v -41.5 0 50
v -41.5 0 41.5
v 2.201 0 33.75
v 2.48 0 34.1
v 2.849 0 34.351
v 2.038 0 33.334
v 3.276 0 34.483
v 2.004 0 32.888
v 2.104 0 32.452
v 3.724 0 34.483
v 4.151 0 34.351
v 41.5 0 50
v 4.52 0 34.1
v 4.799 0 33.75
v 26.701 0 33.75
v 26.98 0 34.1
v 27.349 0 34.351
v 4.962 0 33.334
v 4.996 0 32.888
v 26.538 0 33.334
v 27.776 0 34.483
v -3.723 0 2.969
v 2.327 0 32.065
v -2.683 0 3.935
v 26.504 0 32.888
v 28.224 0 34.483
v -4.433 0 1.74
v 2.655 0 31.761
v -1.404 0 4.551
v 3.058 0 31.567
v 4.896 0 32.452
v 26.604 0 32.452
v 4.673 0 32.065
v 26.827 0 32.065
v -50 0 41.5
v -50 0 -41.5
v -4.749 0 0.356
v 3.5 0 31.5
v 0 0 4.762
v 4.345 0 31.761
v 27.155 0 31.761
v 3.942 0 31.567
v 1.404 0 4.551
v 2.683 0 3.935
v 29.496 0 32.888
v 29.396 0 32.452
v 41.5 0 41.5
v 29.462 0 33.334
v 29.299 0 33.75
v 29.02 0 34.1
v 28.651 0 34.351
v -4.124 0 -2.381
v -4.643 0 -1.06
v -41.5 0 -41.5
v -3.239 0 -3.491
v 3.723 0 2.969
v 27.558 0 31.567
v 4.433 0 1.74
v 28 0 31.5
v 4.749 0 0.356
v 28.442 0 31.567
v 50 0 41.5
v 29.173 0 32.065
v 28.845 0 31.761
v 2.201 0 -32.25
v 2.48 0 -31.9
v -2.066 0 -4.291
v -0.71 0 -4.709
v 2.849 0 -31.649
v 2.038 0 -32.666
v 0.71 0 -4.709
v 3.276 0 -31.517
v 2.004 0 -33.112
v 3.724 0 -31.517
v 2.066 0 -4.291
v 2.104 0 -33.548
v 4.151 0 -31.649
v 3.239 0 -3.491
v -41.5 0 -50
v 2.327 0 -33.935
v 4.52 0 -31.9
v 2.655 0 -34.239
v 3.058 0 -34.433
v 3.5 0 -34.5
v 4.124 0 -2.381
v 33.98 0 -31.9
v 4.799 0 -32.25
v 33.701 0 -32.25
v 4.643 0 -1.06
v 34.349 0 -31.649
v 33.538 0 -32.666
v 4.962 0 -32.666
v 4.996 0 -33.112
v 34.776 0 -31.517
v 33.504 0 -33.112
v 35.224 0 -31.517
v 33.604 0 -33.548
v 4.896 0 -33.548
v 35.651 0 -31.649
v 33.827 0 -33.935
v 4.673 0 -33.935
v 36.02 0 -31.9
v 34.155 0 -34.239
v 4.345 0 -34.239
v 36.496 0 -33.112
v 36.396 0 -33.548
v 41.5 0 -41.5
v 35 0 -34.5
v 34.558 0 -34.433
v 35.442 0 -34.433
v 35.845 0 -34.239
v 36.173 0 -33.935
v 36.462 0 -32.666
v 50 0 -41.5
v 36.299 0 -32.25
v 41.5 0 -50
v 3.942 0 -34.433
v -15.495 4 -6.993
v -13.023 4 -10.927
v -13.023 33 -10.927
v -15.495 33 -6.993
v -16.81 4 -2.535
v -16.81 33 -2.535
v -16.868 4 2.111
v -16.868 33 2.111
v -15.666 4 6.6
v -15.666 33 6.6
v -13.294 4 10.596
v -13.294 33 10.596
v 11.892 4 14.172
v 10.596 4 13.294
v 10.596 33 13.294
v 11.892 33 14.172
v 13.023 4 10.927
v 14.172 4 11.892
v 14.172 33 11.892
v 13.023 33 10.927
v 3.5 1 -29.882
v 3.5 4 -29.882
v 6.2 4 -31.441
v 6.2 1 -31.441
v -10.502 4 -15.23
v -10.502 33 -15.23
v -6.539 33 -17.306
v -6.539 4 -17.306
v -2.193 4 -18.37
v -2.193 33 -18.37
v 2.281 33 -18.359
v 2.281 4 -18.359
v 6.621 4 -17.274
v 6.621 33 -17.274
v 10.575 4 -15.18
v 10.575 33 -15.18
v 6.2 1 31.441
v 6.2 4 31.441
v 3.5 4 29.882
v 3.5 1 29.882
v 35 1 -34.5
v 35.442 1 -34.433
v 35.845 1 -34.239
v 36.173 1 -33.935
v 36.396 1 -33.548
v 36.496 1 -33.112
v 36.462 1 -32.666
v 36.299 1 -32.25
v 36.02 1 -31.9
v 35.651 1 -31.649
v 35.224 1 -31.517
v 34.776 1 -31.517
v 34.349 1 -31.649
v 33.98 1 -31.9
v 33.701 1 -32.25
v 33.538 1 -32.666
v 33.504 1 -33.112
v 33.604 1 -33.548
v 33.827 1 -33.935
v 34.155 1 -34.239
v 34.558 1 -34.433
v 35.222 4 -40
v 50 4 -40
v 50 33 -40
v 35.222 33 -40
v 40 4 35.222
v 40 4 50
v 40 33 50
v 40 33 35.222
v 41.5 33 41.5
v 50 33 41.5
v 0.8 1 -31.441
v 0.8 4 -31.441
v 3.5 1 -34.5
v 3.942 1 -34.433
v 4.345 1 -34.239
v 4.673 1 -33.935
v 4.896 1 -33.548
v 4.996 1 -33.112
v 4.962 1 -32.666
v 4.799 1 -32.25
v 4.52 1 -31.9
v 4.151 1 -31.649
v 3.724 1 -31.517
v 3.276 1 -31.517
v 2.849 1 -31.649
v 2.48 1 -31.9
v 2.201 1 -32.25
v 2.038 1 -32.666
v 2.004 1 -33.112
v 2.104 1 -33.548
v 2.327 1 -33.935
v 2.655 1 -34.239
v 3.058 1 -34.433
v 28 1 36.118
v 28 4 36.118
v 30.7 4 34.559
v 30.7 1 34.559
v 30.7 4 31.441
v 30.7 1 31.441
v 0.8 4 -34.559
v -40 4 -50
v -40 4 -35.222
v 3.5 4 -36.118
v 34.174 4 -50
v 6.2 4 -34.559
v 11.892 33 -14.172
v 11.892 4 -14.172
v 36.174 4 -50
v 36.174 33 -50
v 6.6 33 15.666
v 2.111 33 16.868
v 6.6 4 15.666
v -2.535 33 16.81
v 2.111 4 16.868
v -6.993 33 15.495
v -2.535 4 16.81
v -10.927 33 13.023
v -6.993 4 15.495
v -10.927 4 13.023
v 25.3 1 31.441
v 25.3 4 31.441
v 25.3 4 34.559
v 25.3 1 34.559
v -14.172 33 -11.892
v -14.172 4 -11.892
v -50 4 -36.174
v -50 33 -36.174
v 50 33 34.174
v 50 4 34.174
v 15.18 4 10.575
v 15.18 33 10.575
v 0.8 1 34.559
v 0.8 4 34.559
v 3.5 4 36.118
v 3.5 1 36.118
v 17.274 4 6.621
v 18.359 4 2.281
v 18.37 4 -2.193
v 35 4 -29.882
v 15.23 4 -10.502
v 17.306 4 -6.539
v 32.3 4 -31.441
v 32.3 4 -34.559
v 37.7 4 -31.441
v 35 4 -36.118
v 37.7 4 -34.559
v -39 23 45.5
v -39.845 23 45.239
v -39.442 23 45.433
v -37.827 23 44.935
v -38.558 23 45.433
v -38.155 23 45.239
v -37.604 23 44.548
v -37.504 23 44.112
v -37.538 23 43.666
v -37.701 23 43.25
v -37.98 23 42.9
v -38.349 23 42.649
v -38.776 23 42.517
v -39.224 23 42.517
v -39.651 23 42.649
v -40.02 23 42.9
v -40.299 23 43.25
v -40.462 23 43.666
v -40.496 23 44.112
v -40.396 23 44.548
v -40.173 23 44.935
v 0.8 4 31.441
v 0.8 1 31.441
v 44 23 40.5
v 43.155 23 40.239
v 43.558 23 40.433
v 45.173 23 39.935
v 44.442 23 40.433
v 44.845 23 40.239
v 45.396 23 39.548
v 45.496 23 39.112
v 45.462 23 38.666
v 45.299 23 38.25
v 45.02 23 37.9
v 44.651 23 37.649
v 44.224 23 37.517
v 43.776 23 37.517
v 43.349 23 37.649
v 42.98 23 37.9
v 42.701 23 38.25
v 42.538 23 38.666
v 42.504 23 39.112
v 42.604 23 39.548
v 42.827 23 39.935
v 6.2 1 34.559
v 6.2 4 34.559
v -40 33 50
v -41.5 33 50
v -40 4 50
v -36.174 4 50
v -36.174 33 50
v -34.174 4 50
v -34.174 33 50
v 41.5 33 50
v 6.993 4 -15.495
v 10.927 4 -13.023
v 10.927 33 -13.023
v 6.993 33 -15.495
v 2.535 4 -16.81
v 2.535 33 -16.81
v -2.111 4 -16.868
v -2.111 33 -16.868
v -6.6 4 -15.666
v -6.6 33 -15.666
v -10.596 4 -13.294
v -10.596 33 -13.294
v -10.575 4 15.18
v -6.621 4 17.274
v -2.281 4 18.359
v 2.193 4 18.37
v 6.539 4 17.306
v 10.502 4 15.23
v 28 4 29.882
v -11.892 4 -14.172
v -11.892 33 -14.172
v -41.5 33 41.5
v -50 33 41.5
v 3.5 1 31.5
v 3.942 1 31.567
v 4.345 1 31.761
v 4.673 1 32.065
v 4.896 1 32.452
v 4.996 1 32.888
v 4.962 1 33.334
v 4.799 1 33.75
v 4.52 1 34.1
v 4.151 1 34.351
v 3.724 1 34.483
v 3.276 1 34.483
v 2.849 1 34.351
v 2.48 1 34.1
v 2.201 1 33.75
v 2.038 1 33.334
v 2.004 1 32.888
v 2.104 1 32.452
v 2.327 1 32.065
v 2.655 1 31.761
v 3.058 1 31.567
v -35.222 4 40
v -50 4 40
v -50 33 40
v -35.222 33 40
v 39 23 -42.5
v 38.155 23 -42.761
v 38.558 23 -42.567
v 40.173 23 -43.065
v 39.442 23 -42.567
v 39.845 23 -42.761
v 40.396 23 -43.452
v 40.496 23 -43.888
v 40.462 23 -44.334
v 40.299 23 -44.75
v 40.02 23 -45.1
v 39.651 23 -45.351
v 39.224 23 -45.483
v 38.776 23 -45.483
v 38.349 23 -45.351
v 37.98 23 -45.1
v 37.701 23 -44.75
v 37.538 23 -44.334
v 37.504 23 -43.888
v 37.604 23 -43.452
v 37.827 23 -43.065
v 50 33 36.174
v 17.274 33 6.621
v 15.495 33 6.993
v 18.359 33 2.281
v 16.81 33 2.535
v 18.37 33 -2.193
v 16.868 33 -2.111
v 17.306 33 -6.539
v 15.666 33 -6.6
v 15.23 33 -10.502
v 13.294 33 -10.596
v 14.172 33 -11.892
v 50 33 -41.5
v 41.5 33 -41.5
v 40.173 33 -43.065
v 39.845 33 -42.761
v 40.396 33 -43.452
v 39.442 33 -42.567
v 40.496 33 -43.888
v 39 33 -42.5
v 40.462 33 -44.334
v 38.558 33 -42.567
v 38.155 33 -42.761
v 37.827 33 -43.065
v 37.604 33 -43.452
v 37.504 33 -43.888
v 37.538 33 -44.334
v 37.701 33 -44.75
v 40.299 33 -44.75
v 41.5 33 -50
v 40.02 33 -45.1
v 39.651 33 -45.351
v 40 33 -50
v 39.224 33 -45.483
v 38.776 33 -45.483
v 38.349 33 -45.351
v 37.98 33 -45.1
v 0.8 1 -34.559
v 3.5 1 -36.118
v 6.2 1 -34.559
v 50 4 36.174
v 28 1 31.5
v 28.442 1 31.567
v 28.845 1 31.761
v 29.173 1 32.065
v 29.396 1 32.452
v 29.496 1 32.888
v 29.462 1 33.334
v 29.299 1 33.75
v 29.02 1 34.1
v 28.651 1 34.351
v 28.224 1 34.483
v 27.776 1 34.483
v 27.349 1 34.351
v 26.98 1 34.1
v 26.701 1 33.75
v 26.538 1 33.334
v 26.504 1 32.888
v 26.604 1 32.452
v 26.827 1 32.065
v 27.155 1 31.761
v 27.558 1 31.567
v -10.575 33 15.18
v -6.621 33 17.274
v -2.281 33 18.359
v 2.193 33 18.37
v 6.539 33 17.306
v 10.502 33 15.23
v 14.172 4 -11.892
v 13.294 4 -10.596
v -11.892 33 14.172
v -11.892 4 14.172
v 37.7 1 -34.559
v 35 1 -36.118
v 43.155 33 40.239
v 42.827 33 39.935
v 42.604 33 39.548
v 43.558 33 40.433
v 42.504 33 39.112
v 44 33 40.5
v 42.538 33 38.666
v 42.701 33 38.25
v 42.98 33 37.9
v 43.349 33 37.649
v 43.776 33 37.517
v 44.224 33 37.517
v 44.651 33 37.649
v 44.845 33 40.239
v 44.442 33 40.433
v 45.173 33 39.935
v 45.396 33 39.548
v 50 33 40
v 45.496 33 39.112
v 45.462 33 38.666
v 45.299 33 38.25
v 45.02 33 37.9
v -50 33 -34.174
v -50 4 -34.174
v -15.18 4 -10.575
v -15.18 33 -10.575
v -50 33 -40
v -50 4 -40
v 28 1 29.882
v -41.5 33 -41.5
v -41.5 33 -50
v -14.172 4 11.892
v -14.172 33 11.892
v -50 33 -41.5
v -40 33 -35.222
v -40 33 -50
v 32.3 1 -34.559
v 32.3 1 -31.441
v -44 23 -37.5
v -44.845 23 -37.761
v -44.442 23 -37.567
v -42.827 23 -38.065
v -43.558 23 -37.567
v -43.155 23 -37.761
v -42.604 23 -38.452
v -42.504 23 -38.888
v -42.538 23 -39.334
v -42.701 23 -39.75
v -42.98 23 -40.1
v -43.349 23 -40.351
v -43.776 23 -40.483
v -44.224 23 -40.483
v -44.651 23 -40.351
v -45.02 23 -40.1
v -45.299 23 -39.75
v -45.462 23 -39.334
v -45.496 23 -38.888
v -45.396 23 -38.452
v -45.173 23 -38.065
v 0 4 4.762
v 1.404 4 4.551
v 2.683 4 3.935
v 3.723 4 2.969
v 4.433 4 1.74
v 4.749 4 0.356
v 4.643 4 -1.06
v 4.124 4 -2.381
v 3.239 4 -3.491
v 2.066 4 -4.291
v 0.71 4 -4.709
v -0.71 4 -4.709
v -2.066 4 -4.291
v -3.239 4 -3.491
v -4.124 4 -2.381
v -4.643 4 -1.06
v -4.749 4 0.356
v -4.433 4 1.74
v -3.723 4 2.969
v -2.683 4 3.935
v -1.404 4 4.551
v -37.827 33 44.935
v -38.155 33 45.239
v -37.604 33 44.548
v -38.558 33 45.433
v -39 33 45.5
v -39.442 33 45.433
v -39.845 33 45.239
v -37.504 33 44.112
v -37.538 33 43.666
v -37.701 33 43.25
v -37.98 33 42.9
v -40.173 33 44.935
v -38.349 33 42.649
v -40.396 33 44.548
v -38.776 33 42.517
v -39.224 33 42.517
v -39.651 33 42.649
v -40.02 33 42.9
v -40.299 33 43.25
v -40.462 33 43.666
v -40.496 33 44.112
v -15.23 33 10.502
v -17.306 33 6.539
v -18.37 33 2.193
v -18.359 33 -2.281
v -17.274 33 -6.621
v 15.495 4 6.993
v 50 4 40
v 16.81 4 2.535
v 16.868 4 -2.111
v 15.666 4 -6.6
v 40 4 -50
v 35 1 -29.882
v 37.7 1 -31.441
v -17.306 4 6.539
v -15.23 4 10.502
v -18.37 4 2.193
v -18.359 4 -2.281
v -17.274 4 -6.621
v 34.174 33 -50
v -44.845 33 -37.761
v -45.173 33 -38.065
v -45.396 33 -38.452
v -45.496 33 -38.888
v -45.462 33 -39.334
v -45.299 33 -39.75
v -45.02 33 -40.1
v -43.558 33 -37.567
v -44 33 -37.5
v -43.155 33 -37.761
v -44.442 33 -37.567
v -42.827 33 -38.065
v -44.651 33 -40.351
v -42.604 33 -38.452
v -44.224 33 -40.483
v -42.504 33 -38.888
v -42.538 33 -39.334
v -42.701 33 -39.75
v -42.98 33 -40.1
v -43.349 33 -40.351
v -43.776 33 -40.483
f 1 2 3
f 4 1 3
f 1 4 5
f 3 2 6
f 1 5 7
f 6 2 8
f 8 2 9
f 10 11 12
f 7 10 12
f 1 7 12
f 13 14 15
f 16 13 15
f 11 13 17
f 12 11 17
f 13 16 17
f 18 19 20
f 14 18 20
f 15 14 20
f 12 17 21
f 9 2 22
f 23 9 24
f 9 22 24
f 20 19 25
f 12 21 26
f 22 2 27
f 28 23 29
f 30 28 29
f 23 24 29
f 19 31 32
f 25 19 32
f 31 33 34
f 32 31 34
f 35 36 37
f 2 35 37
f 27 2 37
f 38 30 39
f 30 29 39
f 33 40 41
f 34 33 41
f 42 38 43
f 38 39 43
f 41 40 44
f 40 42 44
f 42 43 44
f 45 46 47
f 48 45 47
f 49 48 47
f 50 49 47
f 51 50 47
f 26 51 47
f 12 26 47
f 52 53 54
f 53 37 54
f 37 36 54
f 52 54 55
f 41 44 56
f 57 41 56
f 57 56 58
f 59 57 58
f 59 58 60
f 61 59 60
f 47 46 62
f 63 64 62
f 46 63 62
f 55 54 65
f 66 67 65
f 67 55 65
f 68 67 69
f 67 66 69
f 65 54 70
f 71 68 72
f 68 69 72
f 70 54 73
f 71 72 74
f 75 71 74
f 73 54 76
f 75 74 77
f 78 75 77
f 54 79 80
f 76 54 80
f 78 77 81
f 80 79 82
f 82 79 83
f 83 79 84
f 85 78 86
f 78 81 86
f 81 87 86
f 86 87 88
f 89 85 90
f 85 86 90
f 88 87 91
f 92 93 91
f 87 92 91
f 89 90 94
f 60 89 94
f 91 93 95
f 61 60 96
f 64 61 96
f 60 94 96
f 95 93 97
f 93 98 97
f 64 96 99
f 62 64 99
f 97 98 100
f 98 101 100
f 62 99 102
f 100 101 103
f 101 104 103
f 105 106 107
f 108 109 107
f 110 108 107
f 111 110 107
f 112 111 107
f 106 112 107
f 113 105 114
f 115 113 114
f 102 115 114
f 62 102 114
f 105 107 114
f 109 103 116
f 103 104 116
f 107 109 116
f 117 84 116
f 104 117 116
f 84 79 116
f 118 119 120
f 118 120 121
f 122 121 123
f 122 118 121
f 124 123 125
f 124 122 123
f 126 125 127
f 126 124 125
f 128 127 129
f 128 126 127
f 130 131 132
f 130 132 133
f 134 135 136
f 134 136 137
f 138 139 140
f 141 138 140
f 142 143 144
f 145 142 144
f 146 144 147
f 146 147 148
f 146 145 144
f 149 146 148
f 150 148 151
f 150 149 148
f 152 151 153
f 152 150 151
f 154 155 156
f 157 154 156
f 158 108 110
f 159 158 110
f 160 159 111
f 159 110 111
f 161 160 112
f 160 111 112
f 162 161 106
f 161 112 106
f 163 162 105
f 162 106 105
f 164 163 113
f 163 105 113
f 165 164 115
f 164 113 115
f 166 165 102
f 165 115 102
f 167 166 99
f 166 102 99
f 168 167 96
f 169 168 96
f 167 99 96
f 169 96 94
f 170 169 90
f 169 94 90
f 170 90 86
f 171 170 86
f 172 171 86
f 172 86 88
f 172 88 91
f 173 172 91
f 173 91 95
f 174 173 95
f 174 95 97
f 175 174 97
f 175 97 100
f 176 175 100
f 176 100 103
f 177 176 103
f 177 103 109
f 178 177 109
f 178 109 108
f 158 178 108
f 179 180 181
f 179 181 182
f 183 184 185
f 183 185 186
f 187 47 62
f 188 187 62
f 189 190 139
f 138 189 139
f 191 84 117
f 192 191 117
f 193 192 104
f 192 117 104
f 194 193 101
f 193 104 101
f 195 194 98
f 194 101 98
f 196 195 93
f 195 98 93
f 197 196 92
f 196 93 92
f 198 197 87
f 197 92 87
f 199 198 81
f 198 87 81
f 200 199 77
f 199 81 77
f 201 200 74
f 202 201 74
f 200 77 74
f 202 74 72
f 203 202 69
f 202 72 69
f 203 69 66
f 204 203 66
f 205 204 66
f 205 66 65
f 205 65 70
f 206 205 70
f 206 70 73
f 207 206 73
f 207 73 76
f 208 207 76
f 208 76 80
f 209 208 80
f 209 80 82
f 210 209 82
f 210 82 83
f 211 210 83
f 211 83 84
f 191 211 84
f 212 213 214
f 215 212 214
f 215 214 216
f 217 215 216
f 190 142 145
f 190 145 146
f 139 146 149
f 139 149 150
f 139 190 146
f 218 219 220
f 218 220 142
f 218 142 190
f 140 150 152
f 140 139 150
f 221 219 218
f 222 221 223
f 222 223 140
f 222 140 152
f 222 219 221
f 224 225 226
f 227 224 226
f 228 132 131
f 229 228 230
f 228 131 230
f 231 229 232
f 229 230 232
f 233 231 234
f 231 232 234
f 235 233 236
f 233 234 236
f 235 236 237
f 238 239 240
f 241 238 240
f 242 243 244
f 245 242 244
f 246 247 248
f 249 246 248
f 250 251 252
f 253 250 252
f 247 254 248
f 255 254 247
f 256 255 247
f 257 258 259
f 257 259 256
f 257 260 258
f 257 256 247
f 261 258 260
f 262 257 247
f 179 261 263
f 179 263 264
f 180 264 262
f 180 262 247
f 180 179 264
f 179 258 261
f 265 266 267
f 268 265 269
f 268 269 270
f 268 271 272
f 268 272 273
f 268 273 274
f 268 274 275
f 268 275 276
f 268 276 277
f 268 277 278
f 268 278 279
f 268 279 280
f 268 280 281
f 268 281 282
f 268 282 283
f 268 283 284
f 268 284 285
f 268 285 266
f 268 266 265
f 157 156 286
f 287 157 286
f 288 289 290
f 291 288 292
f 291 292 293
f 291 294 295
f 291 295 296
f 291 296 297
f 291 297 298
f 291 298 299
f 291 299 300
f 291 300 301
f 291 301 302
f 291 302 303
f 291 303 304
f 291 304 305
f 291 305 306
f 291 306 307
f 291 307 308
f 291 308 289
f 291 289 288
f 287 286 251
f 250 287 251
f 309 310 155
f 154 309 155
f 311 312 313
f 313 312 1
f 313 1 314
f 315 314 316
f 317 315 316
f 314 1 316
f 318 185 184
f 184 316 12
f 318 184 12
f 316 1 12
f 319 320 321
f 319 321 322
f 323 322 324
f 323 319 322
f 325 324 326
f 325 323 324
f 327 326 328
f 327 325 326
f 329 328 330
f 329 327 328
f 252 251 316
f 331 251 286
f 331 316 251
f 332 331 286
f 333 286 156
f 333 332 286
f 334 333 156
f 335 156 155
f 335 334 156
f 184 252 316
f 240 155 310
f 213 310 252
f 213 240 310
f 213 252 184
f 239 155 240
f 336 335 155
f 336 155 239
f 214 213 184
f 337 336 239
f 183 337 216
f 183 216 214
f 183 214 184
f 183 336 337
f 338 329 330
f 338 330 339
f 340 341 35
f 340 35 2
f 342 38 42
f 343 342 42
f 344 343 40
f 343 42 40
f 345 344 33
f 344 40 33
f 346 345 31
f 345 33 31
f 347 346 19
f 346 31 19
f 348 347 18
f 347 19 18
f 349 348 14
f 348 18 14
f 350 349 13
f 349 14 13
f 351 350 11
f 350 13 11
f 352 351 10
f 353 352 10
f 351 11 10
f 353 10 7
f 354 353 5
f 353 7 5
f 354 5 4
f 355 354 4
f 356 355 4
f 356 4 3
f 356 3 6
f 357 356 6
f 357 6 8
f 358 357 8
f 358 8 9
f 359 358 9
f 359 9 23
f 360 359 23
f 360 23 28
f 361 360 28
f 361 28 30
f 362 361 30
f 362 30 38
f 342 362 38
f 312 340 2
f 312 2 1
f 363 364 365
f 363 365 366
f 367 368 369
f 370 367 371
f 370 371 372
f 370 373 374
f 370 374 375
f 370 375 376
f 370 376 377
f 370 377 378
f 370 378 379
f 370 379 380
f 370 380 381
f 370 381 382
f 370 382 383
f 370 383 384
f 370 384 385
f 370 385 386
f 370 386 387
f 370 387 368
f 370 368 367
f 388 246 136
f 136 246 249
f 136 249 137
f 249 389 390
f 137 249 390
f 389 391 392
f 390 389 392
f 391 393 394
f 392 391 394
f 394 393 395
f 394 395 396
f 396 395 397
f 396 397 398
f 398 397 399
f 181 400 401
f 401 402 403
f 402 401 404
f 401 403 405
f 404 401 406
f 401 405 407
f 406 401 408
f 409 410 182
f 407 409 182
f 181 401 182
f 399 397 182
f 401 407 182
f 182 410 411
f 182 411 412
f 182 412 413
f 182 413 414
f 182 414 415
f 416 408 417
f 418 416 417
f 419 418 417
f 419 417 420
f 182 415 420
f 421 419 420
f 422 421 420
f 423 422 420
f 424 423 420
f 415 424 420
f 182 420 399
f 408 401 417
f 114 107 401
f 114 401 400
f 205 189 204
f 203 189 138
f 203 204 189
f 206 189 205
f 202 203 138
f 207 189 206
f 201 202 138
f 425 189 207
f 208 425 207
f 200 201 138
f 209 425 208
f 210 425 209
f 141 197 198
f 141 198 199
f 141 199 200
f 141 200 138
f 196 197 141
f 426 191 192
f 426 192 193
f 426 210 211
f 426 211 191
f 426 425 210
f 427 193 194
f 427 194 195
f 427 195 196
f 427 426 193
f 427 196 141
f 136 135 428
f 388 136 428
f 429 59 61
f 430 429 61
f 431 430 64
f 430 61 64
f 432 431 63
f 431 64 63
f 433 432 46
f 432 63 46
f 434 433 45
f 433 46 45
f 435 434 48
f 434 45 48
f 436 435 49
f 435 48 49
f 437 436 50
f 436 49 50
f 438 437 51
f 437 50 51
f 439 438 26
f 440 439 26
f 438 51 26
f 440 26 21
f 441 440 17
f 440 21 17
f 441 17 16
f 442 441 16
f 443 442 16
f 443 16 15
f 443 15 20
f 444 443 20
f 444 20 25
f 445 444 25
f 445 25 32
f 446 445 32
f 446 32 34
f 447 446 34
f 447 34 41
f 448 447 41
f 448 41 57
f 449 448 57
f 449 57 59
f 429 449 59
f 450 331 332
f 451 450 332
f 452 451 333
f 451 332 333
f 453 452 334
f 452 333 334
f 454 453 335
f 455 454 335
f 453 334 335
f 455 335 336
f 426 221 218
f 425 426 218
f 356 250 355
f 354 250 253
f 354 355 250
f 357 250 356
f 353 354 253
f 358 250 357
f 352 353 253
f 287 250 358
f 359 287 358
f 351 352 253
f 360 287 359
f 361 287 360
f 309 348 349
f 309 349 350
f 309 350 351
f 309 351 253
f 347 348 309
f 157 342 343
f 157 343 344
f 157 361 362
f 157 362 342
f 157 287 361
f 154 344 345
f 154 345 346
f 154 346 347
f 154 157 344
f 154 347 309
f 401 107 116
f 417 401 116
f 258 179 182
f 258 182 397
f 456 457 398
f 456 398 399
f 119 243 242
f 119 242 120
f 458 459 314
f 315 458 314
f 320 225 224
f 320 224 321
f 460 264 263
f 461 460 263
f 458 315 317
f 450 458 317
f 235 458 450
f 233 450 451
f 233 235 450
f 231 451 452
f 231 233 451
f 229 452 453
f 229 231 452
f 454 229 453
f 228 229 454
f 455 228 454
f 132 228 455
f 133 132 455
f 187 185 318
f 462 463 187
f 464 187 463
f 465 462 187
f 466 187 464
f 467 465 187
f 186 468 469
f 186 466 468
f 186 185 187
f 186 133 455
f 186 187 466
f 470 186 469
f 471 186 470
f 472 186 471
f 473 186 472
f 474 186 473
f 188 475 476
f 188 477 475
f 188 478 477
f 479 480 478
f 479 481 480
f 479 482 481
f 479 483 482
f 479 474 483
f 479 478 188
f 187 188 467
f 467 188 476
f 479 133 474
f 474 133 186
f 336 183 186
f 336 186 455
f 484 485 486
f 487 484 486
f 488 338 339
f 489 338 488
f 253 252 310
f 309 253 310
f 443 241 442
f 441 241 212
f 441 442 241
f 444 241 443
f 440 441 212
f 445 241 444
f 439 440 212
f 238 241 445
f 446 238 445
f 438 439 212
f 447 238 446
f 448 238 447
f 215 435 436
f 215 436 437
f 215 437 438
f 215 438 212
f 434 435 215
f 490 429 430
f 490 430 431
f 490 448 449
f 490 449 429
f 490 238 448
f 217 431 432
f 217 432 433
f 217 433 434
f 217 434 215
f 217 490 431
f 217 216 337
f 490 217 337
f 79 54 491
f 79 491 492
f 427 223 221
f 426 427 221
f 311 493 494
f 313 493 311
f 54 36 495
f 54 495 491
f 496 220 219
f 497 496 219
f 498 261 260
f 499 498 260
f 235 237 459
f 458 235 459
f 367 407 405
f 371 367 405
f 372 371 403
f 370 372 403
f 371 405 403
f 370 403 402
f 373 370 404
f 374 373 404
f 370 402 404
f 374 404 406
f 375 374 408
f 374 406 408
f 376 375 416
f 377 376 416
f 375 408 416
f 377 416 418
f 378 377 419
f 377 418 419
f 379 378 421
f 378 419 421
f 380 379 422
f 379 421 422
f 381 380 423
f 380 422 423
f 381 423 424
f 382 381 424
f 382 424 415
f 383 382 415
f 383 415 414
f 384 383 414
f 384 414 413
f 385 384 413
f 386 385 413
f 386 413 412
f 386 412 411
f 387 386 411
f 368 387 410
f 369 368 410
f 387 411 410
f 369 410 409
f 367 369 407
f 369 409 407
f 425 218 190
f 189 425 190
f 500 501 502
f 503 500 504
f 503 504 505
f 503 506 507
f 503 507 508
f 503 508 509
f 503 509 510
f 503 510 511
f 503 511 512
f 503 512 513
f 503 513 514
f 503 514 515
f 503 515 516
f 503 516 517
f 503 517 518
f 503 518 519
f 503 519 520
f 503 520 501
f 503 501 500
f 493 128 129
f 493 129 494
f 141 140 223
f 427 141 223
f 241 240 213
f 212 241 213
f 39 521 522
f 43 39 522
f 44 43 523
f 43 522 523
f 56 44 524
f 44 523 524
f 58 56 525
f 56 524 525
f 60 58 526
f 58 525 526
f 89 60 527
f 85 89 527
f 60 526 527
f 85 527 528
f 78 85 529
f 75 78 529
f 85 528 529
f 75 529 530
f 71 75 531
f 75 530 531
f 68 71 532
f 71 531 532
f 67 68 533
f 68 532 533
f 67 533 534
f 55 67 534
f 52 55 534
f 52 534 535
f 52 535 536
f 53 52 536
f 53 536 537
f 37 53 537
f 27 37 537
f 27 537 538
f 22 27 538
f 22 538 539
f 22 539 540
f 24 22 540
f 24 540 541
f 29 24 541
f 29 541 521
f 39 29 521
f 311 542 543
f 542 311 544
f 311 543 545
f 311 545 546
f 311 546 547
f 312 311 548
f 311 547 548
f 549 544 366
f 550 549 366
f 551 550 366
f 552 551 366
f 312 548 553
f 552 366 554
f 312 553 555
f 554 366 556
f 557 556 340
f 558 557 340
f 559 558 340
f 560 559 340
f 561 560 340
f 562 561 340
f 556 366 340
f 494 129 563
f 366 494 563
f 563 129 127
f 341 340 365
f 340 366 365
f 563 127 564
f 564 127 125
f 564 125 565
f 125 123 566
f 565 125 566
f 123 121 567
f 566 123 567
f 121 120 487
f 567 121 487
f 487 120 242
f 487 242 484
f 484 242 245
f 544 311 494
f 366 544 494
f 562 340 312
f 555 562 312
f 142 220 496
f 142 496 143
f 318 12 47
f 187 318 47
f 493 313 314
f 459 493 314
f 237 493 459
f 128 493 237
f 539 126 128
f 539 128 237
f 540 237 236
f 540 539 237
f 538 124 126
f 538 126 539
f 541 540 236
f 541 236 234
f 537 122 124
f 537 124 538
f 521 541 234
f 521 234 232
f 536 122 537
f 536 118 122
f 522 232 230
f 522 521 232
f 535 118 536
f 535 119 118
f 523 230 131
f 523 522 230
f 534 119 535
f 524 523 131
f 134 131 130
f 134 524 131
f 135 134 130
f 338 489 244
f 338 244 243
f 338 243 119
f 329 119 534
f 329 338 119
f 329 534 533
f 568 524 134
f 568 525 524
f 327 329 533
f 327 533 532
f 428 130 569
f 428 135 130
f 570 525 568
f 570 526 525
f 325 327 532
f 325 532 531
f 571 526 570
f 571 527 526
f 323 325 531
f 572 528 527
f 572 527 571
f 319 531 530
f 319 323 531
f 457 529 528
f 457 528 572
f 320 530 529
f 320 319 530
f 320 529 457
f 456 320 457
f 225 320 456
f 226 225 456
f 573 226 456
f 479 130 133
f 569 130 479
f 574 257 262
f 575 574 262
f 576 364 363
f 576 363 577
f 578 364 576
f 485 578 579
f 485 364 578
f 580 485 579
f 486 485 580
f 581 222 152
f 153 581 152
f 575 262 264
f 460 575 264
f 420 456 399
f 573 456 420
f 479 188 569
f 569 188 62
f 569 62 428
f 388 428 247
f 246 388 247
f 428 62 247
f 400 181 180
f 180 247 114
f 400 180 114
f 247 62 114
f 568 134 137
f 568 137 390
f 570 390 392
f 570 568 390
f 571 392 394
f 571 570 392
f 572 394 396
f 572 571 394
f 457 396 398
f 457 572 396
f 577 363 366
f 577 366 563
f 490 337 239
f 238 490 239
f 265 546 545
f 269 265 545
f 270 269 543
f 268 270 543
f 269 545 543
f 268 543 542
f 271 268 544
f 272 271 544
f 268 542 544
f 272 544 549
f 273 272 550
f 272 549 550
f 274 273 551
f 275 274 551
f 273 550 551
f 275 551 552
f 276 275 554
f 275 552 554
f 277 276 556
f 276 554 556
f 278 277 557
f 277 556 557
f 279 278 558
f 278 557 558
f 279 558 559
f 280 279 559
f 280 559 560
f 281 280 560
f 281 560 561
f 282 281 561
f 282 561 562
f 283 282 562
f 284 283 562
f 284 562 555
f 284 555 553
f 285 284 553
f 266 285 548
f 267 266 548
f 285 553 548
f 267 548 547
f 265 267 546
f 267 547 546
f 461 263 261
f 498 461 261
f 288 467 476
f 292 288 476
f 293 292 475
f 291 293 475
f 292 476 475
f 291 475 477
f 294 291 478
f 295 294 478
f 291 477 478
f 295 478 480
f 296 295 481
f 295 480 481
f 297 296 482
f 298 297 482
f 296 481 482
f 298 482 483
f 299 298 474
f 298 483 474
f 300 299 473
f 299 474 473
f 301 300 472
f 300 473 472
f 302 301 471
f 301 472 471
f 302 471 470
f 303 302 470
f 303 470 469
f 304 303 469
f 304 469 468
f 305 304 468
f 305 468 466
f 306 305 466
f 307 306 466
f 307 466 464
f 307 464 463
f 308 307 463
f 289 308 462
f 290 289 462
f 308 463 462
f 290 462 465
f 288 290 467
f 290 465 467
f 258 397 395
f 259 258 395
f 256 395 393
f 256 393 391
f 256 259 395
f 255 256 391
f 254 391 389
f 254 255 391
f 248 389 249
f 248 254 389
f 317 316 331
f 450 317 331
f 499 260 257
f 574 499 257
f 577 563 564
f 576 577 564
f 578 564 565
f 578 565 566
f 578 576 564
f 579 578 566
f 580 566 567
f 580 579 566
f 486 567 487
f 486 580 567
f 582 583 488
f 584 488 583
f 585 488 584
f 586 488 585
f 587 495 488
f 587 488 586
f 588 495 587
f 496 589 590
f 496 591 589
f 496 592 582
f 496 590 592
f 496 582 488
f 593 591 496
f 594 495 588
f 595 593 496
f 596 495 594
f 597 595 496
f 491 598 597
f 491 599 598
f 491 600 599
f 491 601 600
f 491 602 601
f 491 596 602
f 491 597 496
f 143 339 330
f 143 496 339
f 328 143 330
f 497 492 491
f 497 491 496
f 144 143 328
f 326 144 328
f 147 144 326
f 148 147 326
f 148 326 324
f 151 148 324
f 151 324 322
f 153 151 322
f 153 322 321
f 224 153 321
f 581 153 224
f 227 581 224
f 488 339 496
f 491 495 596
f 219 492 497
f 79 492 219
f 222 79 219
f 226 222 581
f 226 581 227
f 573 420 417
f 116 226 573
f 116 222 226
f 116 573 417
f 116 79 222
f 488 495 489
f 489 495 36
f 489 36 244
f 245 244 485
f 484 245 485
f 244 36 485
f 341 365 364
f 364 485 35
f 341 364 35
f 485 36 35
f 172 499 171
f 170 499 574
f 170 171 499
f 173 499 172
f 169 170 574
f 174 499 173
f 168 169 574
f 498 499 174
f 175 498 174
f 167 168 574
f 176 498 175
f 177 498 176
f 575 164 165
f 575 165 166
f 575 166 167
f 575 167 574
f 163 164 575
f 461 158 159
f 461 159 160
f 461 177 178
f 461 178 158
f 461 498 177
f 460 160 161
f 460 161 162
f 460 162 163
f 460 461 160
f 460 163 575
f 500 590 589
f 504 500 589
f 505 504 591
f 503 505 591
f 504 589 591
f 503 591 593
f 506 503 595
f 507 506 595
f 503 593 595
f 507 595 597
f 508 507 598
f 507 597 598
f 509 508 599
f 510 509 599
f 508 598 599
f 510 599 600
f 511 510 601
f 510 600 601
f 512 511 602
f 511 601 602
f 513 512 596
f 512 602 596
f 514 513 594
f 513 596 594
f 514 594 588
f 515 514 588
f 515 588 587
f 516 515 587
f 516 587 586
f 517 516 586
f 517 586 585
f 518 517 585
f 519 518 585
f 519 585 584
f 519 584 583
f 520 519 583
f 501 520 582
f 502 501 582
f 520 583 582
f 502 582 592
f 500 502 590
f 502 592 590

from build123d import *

# Parameters (mm, degrees)
SKETCH1_W           = 100
SKETCH1_H           = 100
BOSS_EXTRUDE1_DEPTH = 4
SKETCH2_R           = 4.7625
CUT_EXTRUDE1_DEPTH  = 71.823724839
SKETCH3_W           = 8.5
SKETCH3_H           = 8.5
CUT_EXTRUDE2_DEPTH  = 71.823724839
BOSS_EXTRUDE3_DEPTH = 29
BOSS_EXTRUDE4_DEPTH = 29
CUT_EXTRUDE4_DEPTH  = 77.426435217
BOSS_EXTRUDE5_DEPTH = 29
BOSS_EXTRUDE6_DEPTH = 29
SKETCH12_R          = 1.5
CUT_EXTRUDE5_DEPTH  = 79.0320447
CUT_EXTRUDE6_DEPTH  = 3
SKETCH15_R          = 1.5
CUT_EXTRUDE7_DEPTH  = 10


with BuildPart() as part:
    # Sketch1 → Boss-Extrude1 (new body)
    with BuildSketch(Plane(origin=(0, 0, 0), x_dir=(1, 0, 0), z_dir=(0, 1, 0))):
        Rectangle(SKETCH1_W, SKETCH1_H)
    extrude(amount=BOSS_EXTRUDE1_DEPTH)

    # Sketch2 → Cut-Extrude1 (cut, through all)
    with BuildSketch(Plane(origin=(0, 4, 0), x_dir=(1, 0, 0), z_dir=(0, 1, 0))):
        with Locations(Location((0, 0, 0), (0, 0, 270))):
            Circle(SKETCH2_R)
    extrude(amount=-CUT_EXTRUDE1_DEPTH, mode=Mode.SUBTRACT)

    # Sketch3 → Cut-Extrude2 (cut, through all)
    with BuildSketch(Plane(origin=(0, 4, 0), x_dir=(1, 0, 0), z_dir=(0, 1, 0))):
        with Locations((-45.75, 45.75)):
            Rectangle(SKETCH3_W, SKETCH3_H)
        with Locations((45.75, 45.75)):
            Rectangle(SKETCH3_W, SKETCH3_H)
        with Locations((45.75, -45.75)):
            Rectangle(SKETCH3_W, SKETCH3_H)
        with Locations((-45.75, -45.75)):
            Rectangle(SKETCH3_W, SKETCH3_H)
    extrude(amount=-CUT_EXTRUDE2_DEPTH, mode=Mode.SUBTRACT)

    # Sketch4 → Boss-Extrude3 (add)
    with BuildSketch(Plane(origin=(0, 4, 0), x_dir=(1, 0, 0), z_dir=(0, 1, 0))):
        with BuildLine():
            Line((-10.927389365, -13.022755533), (-11.891570779, -14.171822198))
            ThreePointArc((-11.891570779, -14.171822198), (0, -18.5), (11.891570779, -14.171822198))
            Line((11.891570779, -14.171822198), (10.927389365, -13.022755533))
            ThreePointArc((10.927389365, -13.022755533), (0, -17), (-10.927389365, -13.022755533))
        make_face()
        with BuildLine():
            Line((-13.022755533, -10.927389365), (-14.171822198, -11.891570779))
            ThreePointArc((-14.171822198, -11.891570779), (-18.5, 0), (-14.171822198, 11.891570779))
            Line((-14.171822198, 11.891570779), (-13.022755533, 10.927389365))
            ThreePointArc((-13.022755533, 10.927389365), (-17, 0), (-13.022755533, -10.927389365))
        make_face()
        with BuildLine():
            Line((-10.927389365, 13.022755533), (-11.891570779, 14.171822198))
            ThreePointArc((-11.891570779, 14.171822198), (0, 18.5), (11.891570779, 14.171822198))
            Line((11.891570779, 14.171822198), (10.927389365, 13.022755533))
            ThreePointArc((10.927389365, 13.022755533), (0, 17), (-10.927389365, 13.022755533))
        make_face()
        with BuildLine():
            Line((13.022755533, 10.927389365), (14.171822198, 11.891570779))
            ThreePointArc((14.171822198, 11.891570779), (18.5, 0), (14.171822198, -11.891570779))
            Line((14.171822198, -11.891570779), (13.022755533, -10.927389365))
            ThreePointArc((13.022755533, -10.927389365), (17, 0), (13.022755533, 10.927389365))
        make_face()
    extrude(amount=BOSS_EXTRUDE3_DEPTH)

    # Sketch7 → Boss-Extrude4 (add)
    with BuildSketch(Plane(origin=(0, 4, 0), x_dir=(1, 0, 0), z_dir=(0, 1, 0))):
        Polygon((-41.5, -41.5), (-41.5, -50), (-40, -50), (-40, -40), (-50, -40), (-50, -41.5), align=None)
        Polygon((40, -50), (40, -40), (50, -40), (50, -41.5), (41.5, -41.5), (41.5, -50), align=None)
        Polygon((50, 41.5), (50, 40), (40, 40), (40, 50), (41.5, 50), (41.5, 41.5), align=None)
        Polygon((-50, 41.5), (-50, 40), (-40, 40), (-40, 50), (-41.5, 50), (-41.5, 41.5), align=None)
    extrude(amount=BOSS_EXTRUDE4_DEPTH)

    # Sketch8 → Cut-Extrude4 (cut, through all)
    with BuildSketch(Plane(origin=(0, 4, 0), x_dir=(1, 0, 0), z_dir=(0, 1, 0))):
        Polygon((-14.171822198, -11.891570779), (-40, -50), (-36.17429682, -50), (-11.891570779, -14.171822198), (-9.867198001, -11.184942236), (-12.488706492, -9.408201793), align=None)
        Polygon((-11.891570779, 14.171822198), (-50, 40), (-50, 36.17429682), (-14.171822198, 11.891570779), (-11.184942236, 9.867198001), (-9.408201793, 12.488706492), align=None)
        Polygon((14.171822198, 11.891570779), (40, 50), (36.17429682, 50), (11.891570779, 14.171822198), (9.867198001, 11.184942236), (12.488706492, 9.408201793), align=None)
        Polygon((11.891570779, -14.171822198), (50, -40), (50, -36.17429682), (14.171822198, -11.891570779), (11.184942236, -9.867198001), (9.408201793, -12.488706492), align=None)
    extrude(amount=CUT_EXTRUDE4_DEPTH, mode=Mode.SUBTRACT)

    # Sketch9 → Boss-Extrude5 (add)
    with BuildSketch(Plane(origin=(0, 4, 0), x_dir=(1, 0, 0), z_dir=(0, 1, 0))):
        Polygon((-11.891570779, -14.171822198), (-36.17429682, -50), (-34.17429682, -50), (-10.52109933, -15.100666052), align=None)
        Polygon((-14.171822198, -11.891570779), (-40, -50), (-40, -47.049081084), (-14.981255079, -10.134937263), (-13.610783629, -11.063781117), align=None)
        Polygon((-50, 34.17429682), (-15.100666052, 10.52109933), (-14.171822198, 11.891570779), (-50, 36.17429682), align=None)
        Polygon((-11.891570779, 14.171822198), (-50, 40), (-47.049081084, 40), (-10.134937263, 14.981255079), (-11.063781117, 13.610783629), align=None)
        Polygon((34.17429682, 50), (10.52109933, 15.100666052), (11.891570779, 14.171822198), (36.17429682, 50), align=None)
        Polygon((14.171822198, 11.891570779), (40, 50), (40, 47.049081084), (14.981255079, 10.134937263), (13.610783629, 11.063781117), align=None)
        Polygon((50, -34.17429682), (15.100666052, -10.52109933), (14.171822198, -11.891570779), (50, -36.17429682), align=None)
        Polygon((11.891570779, -14.171822198), (50, -40), (47.049081084, -40), (10.134937263, -14.981255079), (11.063781117, -13.610783629), align=None)
    extrude(amount=BOSS_EXTRUDE5_DEPTH)

    # Sketch11 → Boss-Extrude6 (add)
    with BuildSketch(Plane(origin=(0, 4, 0), x_dir=(1, 0, 0), z_dir=(0, 1, 0))):
        Polygon((-40, -40), (-35.222450169, -40), (-40, -47.049081084), align=None)
        Polygon((-40, 40), (-40, 35.222450169), (-47.049081084, 40), align=None)
        Polygon((40, 40), (35.222450169, 40), (40, 47.049081084), align=None)
        Polygon((40, -40), (40, -35.222450169), (47.049081084, -40), align=None)
    extrude(amount=BOSS_EXTRUDE6_DEPTH)

    # Sketch12 → Cut-Extrude5 (cut, through all)
    with BuildSketch(Plane(origin=(0, 0, 0), x_dir=(-1, 0, 0), z_dir=(0, -1, 0))):
        with Locations(Location((-3.5, 33, 0), (0, 0, 90))):
            Circle(SKETCH12_R)
        with Locations(Location((-3.5, -33, 0), (0, 0, 90))):
            Circle(SKETCH12_R)
        with Locations(Location((-35, 33, 0), (0, 0, 90))):
            Circle(SKETCH12_R)
        with Locations(Location((-28, -33, 0), (0, 0, 90))):
            Circle(SKETCH12_R)
    extrude(amount=-CUT_EXTRUDE5_DEPTH, mode=Mode.SUBTRACT)

    # Sketch14 → Cut-Extrude6 (cut)
    with BuildSketch(Plane(origin=(0, 4, 0), x_dir=(1, 0, 0), z_dir=(0, 1, 0))):
        Polygon((28, -29.882308546), (25.3, -31.441154273), (25.3, -34.558845727), (28, -36.117691454), (30.7, -34.558845727), (30.7, -31.441154273), align=None)
        Polygon((3.5, -29.882308546), (0.8, -31.441154273), (0.8, -34.558845727), (3.5, -36.117691454), (6.2, -34.558845727), (6.2, -31.441154273), align=None)
        Polygon((3.5, 36.117691454), (0.8, 34.558845727), (0.8, 31.441154273), (3.5, 29.882308546), (6.2, 31.441154273), (6.2, 34.558845727), align=None)
        Polygon((35, 36.117691454), (32.3, 34.558845727), (32.3, 31.441154273), (35, 29.882308546), (37.7, 31.441154273), (37.7, 34.558845727), align=None)
    extrude(amount=-CUT_EXTRUDE6_DEPTH, mode=Mode.SUBTRACT)

    # Sketch15 → Cut-Extrude7 (cut)
    with BuildSketch(Plane(origin=(0, 33, 0), x_dir=(1, 0, 0), z_dir=(0, 1, 0))):
        with Locations(Location((44, -39, 0), (0, 0, 270))):
            Circle(SKETCH15_R)
        with Locations(Location((-39, -44, 0), (0, 0, 270))):
            Circle(SKETCH15_R)
        with Locations(Location((-44, 39, 0), (0, 0, 270))):
            Circle(SKETCH15_R)
        with Locations(Location((39, 44, 0), (0, 0, 270))):
            Circle(SKETCH15_R)
    extrude(amount=-CUT_EXTRUDE7_DEPTH, mode=Mode.SUBTRACT)


solid = part.part
